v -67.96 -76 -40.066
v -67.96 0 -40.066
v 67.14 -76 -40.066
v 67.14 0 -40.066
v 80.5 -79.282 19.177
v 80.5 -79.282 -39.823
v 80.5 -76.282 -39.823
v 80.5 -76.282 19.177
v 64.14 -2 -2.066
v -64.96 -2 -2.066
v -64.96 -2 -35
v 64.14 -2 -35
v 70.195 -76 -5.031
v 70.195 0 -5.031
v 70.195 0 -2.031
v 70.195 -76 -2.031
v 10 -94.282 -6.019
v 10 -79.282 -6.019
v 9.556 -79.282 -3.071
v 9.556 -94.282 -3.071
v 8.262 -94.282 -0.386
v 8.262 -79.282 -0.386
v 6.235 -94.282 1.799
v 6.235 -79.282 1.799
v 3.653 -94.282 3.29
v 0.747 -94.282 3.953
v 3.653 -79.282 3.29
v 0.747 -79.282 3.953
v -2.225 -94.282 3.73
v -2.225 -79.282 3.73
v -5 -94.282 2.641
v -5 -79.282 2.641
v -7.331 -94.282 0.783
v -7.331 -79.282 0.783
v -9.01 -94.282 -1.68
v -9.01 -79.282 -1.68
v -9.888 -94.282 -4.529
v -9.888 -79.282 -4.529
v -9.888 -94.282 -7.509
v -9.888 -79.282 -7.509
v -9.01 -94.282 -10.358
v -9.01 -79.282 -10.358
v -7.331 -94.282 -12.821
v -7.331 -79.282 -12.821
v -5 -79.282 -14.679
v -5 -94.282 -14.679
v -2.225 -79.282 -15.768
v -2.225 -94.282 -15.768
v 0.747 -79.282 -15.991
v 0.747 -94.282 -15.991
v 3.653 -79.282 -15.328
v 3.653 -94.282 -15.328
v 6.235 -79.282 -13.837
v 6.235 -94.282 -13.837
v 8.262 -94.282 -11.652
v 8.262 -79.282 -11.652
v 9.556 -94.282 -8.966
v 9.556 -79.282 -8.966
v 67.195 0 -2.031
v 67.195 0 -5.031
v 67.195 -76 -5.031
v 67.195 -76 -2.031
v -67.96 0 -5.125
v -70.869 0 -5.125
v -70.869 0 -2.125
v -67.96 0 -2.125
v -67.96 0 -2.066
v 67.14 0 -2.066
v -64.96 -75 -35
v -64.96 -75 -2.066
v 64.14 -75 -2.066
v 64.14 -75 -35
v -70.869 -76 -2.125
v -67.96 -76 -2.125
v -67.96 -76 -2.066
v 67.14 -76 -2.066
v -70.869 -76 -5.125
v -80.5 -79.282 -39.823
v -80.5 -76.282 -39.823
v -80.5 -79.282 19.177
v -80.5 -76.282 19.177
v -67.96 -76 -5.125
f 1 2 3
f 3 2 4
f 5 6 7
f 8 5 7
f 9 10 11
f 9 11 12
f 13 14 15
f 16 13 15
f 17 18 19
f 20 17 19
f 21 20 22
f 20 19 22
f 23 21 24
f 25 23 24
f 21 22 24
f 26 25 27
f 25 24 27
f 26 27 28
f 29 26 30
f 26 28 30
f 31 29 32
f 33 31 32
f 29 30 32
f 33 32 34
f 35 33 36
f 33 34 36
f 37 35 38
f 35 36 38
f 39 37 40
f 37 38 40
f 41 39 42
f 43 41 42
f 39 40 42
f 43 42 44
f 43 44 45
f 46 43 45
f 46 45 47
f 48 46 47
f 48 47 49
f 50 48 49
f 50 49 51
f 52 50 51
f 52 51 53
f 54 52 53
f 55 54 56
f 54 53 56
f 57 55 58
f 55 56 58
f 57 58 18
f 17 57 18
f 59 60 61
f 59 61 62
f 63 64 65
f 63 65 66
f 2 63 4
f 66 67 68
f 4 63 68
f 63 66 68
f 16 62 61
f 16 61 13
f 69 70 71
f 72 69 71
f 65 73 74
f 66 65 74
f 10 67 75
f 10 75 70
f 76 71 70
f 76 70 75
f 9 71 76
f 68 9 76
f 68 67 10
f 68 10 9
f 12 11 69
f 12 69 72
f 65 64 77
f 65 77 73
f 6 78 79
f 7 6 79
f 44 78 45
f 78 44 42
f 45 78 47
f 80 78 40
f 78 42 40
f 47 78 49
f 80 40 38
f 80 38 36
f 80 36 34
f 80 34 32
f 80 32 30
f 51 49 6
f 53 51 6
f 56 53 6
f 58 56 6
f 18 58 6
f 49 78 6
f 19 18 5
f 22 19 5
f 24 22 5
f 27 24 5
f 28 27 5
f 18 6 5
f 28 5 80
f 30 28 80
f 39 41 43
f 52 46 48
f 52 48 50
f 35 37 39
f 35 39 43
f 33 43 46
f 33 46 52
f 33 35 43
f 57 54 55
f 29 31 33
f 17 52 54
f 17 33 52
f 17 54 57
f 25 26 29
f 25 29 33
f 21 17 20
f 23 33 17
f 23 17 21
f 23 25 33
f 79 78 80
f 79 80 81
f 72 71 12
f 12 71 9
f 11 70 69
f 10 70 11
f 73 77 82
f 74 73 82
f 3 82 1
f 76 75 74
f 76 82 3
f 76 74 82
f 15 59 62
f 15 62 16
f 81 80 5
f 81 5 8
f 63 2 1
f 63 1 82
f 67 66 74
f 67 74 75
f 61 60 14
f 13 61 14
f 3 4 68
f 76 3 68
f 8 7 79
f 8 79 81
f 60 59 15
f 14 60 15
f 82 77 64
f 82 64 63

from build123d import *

# Parameters (mm, degrees)
F0_W      = 135.1
F0_H      = 38
F1_DEPTH  = 76
F2_W      = 3
F2_H      = 59
F3_DEPTH  = 80.5
F4_W      = 129.1
F4_H      = 73
F5_DEPTH  = 35
F6_W      = 3
F6_H      = 3
F7_DEPTH  = 76
F8_W      = 3
F8_H      = 3
F9_DEPTH  = 76
F10_R     = 10
F11_DEPTH = 15


with BuildPart() as f1:
    # F0 (on Front) → F1 (new body)
    with BuildSketch(Plane.XZ):
        with Locations((-0.409585, -21.065706)):
            Rectangle(F0_W, F0_H)
    extrude(amount=F1_DEPTH)

    # F4 (on Top) → F5 (cut)
    with BuildSketch(Plane.XY):
        with Locations((-0.409585, -38.5)):
            Rectangle(F4_W, F4_H)
    extrude(amount=-F5_DEPTH, mode=Mode.SUBTRACT)

    # F8 (on Front) → F9 (join)
    with BuildSketch(Plane.XZ):
        with Locations((-69.368881, -3.62545)):
            Rectangle(F8_W, F8_H)
    extrude(amount=F9_DEPTH)


with BuildPart() as f3:
    # F2 (on Right) → F3 (new body, symmetric)
    with BuildSketch(Plane.YZ):
        with Locations((-77.781531, -10.322884)):
            Rectangle(F2_W, F2_H)
    extrude(amount=F3_DEPTH, both=True)

    # F10 (on face) → F11 (join)
    with BuildSketch(Plane.XZ.offset(79.281531)):
        with Locations((0, -6.018927)):
            Circle(F10_R)
    extrude(amount=F11_DEPTH)


with BuildPart() as f7:
    # F6 (on Front) → F7 (new body)
    with BuildSketch(Plane.XZ):
        with Locations((68.694767, -3.53122)):
            Rectangle(F6_W, F6_H)
    extrude(amount=F7_DEPTH)


solid = Compound([f1.part, f3.part, f7.part])
